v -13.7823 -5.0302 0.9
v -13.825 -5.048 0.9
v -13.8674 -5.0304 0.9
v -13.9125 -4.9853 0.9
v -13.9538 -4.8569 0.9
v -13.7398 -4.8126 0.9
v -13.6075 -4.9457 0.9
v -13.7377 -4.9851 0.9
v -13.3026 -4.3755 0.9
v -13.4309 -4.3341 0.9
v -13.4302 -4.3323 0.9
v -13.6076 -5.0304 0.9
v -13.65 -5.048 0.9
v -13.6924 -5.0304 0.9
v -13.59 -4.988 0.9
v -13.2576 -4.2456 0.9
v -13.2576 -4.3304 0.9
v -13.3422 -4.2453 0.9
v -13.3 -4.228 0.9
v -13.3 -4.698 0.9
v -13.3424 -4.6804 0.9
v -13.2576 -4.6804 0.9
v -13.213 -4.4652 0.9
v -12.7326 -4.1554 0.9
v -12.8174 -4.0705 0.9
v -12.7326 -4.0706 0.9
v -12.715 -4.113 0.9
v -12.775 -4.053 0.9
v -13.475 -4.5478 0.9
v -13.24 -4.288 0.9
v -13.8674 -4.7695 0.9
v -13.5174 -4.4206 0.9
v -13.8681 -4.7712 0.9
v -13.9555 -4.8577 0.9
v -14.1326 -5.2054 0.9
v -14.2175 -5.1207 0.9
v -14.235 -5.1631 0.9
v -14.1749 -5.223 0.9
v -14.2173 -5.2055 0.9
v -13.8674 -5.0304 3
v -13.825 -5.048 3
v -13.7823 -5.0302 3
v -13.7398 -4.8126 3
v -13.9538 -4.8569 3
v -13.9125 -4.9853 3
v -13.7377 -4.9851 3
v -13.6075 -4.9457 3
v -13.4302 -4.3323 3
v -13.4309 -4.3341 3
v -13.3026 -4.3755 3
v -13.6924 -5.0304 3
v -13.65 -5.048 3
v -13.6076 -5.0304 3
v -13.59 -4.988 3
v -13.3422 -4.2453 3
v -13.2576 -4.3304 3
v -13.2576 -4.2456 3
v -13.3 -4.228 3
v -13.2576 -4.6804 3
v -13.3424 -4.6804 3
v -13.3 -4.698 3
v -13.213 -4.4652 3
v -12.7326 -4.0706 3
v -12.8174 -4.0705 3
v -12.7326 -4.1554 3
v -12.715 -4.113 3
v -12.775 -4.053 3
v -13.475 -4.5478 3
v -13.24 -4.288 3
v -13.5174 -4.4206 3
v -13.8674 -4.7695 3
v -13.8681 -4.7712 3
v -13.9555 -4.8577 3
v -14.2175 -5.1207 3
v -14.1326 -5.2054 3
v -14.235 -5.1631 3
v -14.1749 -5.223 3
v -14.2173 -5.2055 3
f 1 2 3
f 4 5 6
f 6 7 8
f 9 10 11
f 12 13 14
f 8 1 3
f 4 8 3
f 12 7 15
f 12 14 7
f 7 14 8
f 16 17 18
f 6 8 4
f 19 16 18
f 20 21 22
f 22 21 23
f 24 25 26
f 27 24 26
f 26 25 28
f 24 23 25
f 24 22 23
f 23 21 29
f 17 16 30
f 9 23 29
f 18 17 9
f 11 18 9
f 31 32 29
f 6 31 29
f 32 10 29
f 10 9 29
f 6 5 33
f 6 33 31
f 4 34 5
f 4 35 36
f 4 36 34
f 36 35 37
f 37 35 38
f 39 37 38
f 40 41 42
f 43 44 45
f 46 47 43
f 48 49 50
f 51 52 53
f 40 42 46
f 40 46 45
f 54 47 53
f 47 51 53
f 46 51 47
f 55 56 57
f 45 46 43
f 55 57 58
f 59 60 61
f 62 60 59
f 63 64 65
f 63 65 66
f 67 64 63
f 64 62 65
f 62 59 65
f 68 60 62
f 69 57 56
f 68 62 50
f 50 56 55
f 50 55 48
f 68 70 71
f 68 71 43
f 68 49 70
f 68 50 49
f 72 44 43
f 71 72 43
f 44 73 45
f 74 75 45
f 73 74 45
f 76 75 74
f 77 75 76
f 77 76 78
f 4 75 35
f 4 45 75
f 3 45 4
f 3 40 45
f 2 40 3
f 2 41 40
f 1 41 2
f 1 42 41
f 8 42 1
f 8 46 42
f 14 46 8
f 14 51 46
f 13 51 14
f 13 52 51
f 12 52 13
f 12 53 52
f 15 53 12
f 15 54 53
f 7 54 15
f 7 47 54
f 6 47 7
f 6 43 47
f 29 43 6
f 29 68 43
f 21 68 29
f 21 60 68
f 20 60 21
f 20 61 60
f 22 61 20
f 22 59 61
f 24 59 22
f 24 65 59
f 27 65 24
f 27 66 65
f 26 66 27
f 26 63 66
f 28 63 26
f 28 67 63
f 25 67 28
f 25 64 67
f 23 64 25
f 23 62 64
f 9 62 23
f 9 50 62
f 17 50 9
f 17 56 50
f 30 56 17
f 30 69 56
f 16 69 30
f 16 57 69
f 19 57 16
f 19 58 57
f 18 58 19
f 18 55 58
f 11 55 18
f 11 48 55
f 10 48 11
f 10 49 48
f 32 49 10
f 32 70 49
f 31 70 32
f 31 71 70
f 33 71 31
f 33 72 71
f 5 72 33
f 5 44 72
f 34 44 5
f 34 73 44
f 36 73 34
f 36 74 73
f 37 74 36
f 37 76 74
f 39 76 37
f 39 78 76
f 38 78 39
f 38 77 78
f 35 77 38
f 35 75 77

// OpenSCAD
$fn = 24;
translate([0, 0.000, 0.900])
  linear_extrude(height=2.100) {
offset(r=0.06, $fn=8) {
    polygon(points=[[-12.775,-4.113],[-13.213,-4.550],[-13.388,-4.375],[-13.300,-4.288],[-14.175,-5.163],[-13.913,-4.900],[-13.825,-4.988],[-13.738,-4.900],[-13.650,-4.988],[-13.475,-4.463],[-13.300,-4.638],[-13.650,-4.988],[-13.825,-4.812]], paths=[[0,1,2,3,4,5,6,7,8],[9,10,11,12]]);
}
}
